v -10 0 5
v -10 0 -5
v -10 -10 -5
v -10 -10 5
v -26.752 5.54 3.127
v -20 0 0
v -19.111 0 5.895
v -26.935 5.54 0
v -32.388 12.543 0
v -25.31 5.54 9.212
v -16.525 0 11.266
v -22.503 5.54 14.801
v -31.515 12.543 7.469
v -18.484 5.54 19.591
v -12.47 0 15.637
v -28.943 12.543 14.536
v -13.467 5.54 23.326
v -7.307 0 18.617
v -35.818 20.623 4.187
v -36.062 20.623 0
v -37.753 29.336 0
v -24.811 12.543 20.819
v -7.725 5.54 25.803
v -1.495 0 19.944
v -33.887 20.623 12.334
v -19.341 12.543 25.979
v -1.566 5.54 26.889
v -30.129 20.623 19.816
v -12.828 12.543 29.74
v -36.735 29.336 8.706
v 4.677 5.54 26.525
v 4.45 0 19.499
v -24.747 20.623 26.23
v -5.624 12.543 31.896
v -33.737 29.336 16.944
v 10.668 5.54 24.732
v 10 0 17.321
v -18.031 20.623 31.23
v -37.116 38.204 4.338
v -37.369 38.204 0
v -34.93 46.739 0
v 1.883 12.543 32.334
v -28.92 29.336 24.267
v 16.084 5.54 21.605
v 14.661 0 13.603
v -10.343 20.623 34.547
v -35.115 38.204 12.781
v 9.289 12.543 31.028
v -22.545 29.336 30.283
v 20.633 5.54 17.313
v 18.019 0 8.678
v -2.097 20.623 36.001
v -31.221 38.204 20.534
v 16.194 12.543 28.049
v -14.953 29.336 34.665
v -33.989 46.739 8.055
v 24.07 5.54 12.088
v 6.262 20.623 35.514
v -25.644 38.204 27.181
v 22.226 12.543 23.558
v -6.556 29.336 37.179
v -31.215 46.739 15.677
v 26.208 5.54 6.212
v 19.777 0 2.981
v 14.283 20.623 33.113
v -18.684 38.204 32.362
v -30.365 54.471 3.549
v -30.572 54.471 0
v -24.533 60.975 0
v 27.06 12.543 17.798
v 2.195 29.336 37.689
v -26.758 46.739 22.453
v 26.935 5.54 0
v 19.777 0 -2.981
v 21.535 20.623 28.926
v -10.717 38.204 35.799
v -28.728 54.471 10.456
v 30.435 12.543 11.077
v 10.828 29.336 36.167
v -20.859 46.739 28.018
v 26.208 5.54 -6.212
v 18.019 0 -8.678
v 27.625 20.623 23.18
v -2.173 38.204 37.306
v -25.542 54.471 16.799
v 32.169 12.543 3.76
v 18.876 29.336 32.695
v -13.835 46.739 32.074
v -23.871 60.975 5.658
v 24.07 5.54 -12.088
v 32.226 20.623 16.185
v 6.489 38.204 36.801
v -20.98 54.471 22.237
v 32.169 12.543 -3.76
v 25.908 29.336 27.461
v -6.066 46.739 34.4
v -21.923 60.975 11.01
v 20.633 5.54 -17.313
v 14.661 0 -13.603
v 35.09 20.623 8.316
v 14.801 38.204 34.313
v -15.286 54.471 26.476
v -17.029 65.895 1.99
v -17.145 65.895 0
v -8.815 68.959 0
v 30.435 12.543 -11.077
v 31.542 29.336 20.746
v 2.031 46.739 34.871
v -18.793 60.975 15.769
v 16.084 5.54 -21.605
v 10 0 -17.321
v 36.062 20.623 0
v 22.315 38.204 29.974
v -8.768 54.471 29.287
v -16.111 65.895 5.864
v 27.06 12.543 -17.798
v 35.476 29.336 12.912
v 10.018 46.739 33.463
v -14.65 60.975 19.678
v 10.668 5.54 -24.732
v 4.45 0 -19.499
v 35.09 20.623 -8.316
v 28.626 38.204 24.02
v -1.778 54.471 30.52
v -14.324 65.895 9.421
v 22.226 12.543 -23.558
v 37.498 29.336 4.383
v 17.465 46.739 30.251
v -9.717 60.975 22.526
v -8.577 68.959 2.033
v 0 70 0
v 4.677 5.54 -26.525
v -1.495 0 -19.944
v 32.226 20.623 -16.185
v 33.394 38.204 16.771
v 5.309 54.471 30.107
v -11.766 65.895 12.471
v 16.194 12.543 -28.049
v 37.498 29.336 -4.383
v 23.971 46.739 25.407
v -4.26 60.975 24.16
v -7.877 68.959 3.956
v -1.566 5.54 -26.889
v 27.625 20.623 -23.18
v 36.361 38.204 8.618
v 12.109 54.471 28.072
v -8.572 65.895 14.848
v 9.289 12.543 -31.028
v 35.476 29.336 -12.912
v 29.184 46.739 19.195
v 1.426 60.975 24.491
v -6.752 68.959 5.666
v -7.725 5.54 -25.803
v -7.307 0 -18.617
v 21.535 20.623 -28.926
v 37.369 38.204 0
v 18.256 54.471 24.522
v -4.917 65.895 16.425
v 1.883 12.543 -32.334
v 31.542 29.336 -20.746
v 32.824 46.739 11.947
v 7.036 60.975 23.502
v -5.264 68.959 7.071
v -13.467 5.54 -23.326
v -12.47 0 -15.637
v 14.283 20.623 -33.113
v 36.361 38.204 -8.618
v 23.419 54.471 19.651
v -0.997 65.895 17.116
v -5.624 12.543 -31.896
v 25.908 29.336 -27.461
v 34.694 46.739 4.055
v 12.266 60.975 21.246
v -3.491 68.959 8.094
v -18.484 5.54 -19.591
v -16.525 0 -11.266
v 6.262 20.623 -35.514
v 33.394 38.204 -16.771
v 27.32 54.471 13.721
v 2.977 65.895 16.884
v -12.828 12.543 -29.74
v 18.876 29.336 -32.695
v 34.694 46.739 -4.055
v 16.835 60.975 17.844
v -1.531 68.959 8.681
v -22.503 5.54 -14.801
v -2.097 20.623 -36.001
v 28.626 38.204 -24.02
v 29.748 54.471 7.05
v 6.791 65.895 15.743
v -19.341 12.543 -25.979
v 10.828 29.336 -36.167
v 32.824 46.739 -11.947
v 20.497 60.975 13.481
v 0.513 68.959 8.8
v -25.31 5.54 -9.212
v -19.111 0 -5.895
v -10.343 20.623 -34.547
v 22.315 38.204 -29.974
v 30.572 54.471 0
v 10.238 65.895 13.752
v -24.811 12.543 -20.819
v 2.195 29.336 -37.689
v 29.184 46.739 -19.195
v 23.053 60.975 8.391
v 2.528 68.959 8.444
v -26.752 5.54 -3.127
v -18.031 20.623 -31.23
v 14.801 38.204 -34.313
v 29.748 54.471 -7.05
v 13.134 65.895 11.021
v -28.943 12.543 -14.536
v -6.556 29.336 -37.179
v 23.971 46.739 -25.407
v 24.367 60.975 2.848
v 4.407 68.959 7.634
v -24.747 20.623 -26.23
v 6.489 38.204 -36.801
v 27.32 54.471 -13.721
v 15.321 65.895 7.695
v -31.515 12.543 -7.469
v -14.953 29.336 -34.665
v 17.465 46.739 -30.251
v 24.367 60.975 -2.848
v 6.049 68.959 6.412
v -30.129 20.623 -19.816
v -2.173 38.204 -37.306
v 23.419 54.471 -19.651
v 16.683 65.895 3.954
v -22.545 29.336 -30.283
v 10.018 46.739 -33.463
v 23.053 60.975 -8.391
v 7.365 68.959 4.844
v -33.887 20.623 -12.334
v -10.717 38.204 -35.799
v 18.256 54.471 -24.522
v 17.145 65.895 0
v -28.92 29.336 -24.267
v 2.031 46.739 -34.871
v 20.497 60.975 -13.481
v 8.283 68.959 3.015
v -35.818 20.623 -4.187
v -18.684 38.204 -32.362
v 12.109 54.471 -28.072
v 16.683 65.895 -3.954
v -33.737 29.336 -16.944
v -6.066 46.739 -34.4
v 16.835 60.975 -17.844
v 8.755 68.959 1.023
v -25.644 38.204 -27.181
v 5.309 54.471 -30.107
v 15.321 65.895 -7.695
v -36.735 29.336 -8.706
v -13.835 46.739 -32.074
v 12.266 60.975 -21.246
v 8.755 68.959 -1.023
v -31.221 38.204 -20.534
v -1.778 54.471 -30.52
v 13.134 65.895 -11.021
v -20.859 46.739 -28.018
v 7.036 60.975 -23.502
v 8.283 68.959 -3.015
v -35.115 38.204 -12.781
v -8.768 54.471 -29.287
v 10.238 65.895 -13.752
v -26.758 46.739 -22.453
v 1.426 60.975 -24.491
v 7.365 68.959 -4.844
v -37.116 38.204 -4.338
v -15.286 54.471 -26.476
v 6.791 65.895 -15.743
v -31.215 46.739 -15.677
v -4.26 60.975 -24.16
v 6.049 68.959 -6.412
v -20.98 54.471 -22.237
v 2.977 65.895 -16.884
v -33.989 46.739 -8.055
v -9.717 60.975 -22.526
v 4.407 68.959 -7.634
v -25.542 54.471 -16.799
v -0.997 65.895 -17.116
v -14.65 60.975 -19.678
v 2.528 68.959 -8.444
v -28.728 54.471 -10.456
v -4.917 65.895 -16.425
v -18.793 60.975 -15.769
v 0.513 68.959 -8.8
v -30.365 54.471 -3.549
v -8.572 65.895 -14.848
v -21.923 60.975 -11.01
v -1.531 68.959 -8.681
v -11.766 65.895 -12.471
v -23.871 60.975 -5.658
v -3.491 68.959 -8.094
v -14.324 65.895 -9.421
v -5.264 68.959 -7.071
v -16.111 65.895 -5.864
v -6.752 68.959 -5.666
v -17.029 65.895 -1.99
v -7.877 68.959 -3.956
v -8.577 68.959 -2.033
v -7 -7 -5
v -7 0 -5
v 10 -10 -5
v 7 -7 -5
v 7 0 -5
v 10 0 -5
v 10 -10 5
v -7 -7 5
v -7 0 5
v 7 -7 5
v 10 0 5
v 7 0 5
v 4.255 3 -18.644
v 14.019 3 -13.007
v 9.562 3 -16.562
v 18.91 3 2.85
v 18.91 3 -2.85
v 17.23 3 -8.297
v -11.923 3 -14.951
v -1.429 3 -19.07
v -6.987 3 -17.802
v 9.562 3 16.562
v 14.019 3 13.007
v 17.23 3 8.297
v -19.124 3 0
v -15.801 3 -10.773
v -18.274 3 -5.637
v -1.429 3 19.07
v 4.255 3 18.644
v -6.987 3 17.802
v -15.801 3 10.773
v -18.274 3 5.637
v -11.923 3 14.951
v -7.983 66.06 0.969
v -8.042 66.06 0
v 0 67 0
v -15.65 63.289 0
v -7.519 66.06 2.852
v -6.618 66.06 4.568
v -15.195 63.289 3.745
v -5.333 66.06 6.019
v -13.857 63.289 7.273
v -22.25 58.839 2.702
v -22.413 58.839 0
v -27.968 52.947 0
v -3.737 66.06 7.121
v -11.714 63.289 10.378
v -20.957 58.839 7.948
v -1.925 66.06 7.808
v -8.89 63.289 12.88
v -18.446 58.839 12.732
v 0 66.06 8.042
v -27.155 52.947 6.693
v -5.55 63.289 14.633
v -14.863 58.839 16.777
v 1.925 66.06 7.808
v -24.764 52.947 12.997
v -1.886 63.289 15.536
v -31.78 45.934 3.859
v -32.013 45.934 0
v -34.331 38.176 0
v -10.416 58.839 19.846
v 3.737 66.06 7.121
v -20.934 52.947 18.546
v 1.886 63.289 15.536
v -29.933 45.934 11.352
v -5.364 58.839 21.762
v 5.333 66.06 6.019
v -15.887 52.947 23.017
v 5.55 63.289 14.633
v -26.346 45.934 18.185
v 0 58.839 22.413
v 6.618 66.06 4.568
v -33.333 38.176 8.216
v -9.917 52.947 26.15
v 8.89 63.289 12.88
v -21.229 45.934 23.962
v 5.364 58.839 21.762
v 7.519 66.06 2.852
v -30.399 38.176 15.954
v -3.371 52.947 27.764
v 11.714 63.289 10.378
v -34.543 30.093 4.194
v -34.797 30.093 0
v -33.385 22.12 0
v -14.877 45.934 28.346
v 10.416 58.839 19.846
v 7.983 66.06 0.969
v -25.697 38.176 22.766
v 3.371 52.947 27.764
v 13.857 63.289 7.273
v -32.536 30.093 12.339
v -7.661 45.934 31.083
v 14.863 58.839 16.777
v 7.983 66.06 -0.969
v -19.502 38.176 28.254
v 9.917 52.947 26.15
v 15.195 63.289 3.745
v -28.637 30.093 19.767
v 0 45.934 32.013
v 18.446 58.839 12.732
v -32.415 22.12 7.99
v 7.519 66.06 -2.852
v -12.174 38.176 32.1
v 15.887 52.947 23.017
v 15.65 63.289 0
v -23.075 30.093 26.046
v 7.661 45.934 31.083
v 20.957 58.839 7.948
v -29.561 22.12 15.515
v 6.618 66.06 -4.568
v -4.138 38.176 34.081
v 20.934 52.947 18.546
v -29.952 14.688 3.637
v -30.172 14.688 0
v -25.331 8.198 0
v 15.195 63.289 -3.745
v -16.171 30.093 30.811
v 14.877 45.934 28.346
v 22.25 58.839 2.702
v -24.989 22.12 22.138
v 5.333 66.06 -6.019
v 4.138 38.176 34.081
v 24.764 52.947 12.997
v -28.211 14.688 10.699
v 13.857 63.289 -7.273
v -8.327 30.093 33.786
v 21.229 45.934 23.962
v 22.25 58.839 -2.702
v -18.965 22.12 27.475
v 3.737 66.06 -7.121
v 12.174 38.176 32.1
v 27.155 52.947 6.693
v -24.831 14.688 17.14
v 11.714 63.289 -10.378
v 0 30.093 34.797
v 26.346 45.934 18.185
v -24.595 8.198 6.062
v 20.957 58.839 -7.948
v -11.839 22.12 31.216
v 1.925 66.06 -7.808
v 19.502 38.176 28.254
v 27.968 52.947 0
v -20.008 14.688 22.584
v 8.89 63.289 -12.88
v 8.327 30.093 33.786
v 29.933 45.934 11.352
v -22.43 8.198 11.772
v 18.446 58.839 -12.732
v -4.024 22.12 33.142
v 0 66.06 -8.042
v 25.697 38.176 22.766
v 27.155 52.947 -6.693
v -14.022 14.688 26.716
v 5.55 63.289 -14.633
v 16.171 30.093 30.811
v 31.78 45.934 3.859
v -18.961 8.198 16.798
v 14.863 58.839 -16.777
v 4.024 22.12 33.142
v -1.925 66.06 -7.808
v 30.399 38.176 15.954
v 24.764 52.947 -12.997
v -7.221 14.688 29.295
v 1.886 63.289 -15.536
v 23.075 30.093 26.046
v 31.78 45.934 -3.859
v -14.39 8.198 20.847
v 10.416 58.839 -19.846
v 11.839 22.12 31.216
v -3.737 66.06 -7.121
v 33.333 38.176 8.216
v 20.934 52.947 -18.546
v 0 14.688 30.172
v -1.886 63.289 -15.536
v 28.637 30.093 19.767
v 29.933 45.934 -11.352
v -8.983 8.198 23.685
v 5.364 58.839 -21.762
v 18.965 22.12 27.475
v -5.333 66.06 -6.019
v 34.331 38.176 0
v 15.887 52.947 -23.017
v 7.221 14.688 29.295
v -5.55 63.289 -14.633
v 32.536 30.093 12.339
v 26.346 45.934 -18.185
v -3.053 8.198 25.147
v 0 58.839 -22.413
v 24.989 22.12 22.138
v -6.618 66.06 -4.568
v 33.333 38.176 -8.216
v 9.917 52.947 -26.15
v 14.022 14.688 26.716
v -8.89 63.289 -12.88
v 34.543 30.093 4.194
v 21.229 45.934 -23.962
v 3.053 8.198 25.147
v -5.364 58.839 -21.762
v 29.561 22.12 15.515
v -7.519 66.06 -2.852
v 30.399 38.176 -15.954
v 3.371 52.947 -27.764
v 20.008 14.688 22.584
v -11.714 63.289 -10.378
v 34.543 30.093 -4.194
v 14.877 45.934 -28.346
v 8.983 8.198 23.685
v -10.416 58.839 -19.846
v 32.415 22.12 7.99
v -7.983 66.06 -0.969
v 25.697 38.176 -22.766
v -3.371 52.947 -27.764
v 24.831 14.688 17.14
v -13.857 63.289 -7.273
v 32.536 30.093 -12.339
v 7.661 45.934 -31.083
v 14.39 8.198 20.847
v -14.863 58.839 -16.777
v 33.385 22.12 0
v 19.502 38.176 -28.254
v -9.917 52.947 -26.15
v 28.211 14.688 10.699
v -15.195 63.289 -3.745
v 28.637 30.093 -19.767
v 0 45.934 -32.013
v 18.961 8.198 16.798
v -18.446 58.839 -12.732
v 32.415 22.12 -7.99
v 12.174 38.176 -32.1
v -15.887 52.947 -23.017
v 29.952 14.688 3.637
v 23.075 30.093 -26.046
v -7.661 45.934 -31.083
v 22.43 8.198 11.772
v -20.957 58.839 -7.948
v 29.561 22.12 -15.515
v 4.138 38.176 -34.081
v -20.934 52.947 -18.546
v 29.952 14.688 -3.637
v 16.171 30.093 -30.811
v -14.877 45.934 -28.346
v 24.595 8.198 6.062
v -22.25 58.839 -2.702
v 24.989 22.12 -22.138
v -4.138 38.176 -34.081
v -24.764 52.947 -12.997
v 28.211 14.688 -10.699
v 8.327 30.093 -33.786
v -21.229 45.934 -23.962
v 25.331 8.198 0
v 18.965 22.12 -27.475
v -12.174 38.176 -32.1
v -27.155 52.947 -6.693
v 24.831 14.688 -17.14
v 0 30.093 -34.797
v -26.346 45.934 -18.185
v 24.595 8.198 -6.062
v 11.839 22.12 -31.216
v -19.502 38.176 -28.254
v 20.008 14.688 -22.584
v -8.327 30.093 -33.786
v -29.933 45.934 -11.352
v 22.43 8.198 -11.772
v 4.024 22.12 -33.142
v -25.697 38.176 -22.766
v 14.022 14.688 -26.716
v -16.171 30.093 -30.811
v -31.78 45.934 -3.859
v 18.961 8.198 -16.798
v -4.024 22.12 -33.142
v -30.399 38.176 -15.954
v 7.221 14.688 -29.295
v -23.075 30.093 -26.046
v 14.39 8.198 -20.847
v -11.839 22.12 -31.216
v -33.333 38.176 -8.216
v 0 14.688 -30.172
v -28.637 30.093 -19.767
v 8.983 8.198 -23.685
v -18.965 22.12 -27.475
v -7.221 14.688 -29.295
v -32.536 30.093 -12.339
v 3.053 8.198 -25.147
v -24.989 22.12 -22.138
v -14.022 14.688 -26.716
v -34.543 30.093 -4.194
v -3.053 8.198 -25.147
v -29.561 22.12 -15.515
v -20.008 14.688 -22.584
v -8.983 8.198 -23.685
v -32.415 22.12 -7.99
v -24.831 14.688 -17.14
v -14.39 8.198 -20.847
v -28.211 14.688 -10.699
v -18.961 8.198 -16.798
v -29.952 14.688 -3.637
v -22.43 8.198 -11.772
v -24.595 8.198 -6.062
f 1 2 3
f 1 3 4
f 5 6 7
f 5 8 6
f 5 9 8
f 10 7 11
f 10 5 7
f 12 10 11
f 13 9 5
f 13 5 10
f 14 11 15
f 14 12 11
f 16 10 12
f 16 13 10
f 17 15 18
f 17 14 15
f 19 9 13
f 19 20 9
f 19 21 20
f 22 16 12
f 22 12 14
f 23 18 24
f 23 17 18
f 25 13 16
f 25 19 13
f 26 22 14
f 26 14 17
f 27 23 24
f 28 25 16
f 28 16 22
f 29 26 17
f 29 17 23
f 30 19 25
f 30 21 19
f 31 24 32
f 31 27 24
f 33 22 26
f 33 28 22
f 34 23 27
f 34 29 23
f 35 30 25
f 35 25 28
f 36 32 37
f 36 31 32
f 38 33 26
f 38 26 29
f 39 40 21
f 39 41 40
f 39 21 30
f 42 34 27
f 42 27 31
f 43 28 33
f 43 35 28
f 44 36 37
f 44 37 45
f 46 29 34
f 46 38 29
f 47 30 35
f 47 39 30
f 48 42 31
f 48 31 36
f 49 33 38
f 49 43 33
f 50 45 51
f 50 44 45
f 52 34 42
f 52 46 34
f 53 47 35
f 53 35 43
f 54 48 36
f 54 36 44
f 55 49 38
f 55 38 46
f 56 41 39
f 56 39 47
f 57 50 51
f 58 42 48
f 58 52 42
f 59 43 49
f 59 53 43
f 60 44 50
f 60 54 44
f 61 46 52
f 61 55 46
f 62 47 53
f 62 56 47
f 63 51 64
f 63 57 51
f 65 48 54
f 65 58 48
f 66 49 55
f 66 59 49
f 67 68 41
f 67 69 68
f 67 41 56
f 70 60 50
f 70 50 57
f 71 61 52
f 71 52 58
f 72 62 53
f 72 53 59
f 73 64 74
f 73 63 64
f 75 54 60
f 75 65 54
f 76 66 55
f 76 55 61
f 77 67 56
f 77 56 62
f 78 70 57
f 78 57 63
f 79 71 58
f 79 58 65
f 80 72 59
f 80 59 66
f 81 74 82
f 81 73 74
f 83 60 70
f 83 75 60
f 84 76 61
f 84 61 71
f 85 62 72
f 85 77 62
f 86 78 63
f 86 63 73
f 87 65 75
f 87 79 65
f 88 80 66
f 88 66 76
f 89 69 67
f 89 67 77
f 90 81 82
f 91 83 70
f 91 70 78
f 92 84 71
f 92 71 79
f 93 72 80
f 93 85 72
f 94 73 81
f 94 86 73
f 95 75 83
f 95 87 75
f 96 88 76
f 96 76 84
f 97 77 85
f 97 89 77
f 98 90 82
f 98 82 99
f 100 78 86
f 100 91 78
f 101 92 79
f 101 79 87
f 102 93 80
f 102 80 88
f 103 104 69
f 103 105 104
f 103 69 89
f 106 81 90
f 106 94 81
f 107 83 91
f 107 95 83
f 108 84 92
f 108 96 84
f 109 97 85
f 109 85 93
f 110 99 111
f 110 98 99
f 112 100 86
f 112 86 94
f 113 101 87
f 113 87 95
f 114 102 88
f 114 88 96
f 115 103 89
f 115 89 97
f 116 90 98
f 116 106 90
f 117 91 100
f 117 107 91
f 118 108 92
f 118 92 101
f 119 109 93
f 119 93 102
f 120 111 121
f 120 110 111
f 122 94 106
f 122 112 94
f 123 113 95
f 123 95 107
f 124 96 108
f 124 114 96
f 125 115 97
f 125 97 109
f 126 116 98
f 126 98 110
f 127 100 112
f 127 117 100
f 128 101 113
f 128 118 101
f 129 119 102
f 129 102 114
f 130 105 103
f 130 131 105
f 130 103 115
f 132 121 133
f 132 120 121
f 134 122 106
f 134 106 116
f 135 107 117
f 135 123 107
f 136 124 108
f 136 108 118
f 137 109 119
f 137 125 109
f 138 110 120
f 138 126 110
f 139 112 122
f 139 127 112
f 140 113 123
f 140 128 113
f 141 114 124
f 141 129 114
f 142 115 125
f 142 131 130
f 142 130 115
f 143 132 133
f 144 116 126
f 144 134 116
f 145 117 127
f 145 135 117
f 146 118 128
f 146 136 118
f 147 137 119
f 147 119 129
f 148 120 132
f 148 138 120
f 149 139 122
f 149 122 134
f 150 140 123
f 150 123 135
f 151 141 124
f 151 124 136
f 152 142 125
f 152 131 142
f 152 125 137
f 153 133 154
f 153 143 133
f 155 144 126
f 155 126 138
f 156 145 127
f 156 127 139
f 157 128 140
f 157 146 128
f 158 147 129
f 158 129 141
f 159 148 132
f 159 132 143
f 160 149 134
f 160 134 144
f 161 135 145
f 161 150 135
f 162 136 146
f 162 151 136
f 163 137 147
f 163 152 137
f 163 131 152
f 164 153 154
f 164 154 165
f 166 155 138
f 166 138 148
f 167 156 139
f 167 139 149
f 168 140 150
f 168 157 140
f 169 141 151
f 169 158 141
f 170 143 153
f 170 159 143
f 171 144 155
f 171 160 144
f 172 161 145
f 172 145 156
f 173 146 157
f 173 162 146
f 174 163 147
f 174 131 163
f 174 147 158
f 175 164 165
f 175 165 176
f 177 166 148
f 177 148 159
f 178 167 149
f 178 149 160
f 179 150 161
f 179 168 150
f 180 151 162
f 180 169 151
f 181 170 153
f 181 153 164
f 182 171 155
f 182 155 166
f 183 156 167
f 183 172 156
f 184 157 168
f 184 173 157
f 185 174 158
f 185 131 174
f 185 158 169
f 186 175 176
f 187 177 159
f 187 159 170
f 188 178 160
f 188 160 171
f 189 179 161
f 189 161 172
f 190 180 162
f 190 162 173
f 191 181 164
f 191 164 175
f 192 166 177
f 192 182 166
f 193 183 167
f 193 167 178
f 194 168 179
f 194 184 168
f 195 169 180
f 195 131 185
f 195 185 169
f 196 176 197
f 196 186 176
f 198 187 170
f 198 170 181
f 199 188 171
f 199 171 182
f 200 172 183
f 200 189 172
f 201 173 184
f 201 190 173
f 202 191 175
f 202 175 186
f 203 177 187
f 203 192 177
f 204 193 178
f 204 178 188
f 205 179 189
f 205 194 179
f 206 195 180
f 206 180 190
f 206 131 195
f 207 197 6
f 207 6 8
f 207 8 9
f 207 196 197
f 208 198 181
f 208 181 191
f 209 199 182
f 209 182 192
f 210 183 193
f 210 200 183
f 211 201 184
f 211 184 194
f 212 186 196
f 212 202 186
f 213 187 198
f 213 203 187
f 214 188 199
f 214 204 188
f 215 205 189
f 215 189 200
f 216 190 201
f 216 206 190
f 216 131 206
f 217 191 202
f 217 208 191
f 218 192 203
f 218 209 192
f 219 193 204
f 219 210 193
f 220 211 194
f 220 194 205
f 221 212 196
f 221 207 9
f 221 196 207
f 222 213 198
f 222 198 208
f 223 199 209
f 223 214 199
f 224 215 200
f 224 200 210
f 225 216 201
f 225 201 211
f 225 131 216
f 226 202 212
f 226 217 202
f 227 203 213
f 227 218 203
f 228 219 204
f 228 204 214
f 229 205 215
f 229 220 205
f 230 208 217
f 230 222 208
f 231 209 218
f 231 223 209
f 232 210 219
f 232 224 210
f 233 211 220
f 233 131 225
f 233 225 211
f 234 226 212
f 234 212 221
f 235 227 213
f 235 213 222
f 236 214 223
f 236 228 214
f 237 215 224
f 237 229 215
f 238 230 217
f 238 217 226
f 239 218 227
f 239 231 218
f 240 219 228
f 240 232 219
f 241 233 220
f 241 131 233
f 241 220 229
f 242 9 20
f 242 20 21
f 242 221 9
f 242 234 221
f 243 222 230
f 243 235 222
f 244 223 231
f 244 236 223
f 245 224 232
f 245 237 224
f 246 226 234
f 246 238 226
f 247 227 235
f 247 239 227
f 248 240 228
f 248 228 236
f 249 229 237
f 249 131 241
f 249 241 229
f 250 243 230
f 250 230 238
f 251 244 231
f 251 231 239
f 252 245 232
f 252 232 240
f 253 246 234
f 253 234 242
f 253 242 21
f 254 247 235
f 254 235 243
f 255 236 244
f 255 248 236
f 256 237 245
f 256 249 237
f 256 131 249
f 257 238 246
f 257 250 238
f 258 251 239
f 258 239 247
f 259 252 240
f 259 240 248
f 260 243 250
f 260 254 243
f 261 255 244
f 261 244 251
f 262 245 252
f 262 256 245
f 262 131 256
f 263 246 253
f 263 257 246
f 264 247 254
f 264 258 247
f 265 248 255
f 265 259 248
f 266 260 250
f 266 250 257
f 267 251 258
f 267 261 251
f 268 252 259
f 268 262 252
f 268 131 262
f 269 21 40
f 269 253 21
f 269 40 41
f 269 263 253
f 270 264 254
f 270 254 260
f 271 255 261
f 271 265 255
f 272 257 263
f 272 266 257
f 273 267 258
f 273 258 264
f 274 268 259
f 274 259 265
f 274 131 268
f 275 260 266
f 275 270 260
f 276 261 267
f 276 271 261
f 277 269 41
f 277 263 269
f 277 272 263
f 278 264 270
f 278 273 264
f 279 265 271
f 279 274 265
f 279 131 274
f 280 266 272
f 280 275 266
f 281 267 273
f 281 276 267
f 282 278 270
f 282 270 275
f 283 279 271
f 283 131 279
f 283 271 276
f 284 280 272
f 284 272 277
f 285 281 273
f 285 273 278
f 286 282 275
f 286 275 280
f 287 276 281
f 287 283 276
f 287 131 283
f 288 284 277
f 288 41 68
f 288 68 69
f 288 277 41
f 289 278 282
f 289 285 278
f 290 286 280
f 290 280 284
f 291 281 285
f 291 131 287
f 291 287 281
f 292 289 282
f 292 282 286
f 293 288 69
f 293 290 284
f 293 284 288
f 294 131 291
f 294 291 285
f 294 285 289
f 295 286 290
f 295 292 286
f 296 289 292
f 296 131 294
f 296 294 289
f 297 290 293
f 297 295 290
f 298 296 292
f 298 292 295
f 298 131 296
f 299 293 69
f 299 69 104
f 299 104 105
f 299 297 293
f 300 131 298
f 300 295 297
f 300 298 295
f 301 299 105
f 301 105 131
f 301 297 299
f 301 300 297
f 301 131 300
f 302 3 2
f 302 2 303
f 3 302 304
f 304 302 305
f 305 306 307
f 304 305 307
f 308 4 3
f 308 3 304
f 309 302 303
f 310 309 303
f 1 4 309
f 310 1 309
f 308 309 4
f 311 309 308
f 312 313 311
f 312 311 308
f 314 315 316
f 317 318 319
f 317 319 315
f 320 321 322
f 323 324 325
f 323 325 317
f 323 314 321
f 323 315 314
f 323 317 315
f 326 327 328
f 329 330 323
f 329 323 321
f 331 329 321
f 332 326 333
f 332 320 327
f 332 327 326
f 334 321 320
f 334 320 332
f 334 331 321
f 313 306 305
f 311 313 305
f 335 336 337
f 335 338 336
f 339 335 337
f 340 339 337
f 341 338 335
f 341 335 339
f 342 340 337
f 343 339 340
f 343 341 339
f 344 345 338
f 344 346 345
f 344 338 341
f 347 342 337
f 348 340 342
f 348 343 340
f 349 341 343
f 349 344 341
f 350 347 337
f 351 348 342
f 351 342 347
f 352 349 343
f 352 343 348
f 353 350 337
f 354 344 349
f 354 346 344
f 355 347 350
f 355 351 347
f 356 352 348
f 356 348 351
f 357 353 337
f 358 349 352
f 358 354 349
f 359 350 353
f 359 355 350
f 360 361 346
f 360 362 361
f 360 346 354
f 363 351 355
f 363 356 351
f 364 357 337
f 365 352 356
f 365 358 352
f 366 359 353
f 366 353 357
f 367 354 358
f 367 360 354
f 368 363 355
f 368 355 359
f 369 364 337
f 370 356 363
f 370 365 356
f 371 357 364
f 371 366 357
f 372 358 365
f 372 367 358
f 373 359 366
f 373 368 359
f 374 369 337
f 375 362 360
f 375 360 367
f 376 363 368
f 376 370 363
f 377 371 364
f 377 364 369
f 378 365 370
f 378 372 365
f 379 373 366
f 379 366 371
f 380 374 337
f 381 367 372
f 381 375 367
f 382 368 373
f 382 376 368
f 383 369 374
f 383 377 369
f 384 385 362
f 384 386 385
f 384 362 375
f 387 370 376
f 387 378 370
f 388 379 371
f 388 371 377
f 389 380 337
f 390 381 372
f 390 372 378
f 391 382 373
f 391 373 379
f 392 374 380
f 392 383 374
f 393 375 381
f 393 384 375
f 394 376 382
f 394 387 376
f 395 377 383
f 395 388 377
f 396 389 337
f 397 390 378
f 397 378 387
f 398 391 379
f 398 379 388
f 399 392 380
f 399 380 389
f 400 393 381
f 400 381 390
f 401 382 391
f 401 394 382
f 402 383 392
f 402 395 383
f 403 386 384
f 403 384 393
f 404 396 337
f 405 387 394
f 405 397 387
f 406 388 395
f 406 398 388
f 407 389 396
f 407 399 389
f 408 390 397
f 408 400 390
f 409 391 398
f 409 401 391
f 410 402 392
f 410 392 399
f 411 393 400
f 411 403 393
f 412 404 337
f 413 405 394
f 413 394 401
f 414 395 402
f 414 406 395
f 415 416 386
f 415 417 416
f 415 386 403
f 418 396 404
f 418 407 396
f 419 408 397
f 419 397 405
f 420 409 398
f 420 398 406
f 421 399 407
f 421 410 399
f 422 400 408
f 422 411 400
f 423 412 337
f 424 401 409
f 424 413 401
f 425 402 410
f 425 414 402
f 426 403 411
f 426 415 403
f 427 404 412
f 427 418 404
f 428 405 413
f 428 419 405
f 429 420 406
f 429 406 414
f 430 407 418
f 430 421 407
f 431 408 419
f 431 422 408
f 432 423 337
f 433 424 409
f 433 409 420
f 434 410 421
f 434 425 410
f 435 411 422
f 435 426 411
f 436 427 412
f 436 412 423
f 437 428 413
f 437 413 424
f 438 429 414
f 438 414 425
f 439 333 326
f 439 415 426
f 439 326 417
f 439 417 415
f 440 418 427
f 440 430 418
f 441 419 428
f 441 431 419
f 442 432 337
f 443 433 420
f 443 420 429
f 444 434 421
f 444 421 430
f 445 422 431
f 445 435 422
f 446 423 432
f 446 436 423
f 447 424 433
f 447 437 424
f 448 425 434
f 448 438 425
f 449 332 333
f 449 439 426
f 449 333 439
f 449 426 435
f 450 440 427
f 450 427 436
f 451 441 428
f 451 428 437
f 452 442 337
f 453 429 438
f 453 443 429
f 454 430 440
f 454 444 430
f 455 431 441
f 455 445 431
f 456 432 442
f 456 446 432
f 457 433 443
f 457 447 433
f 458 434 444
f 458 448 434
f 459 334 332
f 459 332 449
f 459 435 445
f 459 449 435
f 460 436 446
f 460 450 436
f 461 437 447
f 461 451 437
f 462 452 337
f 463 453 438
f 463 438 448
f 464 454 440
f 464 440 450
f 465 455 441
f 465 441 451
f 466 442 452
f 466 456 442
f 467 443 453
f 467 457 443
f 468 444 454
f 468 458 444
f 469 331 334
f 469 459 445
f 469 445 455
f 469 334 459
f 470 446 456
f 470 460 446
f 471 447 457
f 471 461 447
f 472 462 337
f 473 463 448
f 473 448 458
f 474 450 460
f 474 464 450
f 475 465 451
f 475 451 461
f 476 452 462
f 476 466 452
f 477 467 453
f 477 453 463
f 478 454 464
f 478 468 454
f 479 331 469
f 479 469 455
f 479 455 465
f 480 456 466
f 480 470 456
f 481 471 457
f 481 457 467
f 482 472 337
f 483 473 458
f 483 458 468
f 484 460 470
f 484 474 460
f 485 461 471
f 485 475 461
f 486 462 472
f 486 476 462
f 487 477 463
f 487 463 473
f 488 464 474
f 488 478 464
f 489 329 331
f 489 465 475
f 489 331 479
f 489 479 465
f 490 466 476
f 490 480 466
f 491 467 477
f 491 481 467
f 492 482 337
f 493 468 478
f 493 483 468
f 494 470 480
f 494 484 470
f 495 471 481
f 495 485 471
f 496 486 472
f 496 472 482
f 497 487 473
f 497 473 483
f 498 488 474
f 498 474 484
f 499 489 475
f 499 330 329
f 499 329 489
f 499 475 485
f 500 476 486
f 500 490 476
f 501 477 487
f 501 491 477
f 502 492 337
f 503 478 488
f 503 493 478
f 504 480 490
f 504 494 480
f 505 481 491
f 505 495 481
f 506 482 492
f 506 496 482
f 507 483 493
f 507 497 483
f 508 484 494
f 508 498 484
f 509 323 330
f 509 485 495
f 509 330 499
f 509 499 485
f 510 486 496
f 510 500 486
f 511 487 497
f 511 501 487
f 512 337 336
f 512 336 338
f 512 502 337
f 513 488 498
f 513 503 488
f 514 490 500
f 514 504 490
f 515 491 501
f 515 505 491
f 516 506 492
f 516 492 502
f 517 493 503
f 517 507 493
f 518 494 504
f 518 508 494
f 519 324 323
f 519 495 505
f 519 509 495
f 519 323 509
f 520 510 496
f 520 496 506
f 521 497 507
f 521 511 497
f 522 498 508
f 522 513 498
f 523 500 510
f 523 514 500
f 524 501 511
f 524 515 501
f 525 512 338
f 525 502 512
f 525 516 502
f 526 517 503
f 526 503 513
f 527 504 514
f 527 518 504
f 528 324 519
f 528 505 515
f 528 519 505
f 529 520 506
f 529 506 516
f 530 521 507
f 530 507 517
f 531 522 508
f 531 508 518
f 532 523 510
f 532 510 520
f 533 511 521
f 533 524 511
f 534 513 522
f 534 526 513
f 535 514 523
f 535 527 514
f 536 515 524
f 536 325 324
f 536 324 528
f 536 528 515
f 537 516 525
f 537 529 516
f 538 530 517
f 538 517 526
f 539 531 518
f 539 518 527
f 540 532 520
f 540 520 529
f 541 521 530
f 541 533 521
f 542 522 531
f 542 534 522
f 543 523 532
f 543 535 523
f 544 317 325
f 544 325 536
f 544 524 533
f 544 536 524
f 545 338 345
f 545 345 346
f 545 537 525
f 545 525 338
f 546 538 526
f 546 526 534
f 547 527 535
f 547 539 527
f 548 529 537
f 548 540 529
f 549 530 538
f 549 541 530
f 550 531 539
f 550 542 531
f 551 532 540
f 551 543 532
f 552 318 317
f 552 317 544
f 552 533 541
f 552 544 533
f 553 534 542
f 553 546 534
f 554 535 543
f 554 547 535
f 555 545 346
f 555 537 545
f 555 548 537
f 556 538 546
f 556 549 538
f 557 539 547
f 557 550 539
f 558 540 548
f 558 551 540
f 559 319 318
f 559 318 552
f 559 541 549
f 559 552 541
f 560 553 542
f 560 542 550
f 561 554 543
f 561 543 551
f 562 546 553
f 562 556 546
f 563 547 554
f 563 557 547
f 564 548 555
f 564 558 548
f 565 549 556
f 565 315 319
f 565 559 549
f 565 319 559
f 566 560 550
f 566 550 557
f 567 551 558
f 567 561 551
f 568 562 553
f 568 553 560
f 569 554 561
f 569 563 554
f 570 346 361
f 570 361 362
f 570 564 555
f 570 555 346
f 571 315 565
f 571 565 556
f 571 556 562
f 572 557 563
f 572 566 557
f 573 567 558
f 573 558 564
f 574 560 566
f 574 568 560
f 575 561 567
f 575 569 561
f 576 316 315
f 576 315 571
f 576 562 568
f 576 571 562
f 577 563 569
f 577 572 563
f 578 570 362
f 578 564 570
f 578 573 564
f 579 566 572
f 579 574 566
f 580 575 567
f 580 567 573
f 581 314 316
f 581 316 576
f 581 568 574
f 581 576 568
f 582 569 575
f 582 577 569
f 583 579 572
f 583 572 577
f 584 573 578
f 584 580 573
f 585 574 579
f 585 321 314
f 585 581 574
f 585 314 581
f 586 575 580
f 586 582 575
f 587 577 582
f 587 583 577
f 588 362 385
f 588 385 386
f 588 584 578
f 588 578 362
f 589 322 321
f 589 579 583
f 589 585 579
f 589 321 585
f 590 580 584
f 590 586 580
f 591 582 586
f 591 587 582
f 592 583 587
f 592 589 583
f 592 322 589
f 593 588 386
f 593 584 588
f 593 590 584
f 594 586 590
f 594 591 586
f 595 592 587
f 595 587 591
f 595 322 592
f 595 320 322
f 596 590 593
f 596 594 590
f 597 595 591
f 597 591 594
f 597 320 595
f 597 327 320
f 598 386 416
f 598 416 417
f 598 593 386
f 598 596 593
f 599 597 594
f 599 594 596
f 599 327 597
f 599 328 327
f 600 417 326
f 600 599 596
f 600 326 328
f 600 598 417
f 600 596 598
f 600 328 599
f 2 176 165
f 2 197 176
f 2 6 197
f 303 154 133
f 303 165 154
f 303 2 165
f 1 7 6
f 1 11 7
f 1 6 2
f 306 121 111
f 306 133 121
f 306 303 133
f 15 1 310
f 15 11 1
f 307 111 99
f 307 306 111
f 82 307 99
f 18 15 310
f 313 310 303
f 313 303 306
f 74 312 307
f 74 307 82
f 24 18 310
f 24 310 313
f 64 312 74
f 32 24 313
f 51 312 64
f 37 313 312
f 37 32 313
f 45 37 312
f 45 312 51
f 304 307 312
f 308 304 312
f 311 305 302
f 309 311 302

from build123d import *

# Parameters (mm, degrees)
ESQUISSE2_W             = 20
ESQUISSE2_H             = 10
BOSS_EXTRU_1_DEPTH      = 10
ENL_V_MAT_EXTRU_2_DEPTH = 10


with BuildPart() as part:
    # Esquisse1 → Révolution3 (revolve)
    with BuildSketch(Plane.XY):
        with BuildLine():
            Line((0, 0), (-20, 0))
            ThreePointArc((-20, 0), (-36.400549446, 42.543014128), (0, 70))
            Line((0, 70), (0, 67))
            ThreePointArc((0, 67), (-33.398032448, 42.122428112), (-19.123657749, 3))
            Line((-19.123657749, 3), (0, 3))
            Line((0, 3), (0, 0))
        make_face()
    revolve(axis=Axis((0, 0, 0), (0, 1, 0)))

    # Esquisse2 → Boss.-Extru.1 (add)
    with BuildSketch(Plane.XZ):
        Rectangle(ESQUISSE2_W, ESQUISSE2_H)
    extrude(amount=BOSS_EXTRU_1_DEPTH)

    # Esquisse3 → Enlèv. mat.-Extru.2 (cut)
    with BuildSketch(Plane(origin=(0, 0, -5), x_dir=(-1, 0, 0), z_dir=(0, 0, -1))):
        Polygon((7, -3), (7, 0), (-7, 0), (-7, -3), (-7, -7), (7, -7), align=None)
    extrude(amount=-ENL_V_MAT_EXTRU_2_DEPTH, mode=Mode.SUBTRACT)


solid = part.part
